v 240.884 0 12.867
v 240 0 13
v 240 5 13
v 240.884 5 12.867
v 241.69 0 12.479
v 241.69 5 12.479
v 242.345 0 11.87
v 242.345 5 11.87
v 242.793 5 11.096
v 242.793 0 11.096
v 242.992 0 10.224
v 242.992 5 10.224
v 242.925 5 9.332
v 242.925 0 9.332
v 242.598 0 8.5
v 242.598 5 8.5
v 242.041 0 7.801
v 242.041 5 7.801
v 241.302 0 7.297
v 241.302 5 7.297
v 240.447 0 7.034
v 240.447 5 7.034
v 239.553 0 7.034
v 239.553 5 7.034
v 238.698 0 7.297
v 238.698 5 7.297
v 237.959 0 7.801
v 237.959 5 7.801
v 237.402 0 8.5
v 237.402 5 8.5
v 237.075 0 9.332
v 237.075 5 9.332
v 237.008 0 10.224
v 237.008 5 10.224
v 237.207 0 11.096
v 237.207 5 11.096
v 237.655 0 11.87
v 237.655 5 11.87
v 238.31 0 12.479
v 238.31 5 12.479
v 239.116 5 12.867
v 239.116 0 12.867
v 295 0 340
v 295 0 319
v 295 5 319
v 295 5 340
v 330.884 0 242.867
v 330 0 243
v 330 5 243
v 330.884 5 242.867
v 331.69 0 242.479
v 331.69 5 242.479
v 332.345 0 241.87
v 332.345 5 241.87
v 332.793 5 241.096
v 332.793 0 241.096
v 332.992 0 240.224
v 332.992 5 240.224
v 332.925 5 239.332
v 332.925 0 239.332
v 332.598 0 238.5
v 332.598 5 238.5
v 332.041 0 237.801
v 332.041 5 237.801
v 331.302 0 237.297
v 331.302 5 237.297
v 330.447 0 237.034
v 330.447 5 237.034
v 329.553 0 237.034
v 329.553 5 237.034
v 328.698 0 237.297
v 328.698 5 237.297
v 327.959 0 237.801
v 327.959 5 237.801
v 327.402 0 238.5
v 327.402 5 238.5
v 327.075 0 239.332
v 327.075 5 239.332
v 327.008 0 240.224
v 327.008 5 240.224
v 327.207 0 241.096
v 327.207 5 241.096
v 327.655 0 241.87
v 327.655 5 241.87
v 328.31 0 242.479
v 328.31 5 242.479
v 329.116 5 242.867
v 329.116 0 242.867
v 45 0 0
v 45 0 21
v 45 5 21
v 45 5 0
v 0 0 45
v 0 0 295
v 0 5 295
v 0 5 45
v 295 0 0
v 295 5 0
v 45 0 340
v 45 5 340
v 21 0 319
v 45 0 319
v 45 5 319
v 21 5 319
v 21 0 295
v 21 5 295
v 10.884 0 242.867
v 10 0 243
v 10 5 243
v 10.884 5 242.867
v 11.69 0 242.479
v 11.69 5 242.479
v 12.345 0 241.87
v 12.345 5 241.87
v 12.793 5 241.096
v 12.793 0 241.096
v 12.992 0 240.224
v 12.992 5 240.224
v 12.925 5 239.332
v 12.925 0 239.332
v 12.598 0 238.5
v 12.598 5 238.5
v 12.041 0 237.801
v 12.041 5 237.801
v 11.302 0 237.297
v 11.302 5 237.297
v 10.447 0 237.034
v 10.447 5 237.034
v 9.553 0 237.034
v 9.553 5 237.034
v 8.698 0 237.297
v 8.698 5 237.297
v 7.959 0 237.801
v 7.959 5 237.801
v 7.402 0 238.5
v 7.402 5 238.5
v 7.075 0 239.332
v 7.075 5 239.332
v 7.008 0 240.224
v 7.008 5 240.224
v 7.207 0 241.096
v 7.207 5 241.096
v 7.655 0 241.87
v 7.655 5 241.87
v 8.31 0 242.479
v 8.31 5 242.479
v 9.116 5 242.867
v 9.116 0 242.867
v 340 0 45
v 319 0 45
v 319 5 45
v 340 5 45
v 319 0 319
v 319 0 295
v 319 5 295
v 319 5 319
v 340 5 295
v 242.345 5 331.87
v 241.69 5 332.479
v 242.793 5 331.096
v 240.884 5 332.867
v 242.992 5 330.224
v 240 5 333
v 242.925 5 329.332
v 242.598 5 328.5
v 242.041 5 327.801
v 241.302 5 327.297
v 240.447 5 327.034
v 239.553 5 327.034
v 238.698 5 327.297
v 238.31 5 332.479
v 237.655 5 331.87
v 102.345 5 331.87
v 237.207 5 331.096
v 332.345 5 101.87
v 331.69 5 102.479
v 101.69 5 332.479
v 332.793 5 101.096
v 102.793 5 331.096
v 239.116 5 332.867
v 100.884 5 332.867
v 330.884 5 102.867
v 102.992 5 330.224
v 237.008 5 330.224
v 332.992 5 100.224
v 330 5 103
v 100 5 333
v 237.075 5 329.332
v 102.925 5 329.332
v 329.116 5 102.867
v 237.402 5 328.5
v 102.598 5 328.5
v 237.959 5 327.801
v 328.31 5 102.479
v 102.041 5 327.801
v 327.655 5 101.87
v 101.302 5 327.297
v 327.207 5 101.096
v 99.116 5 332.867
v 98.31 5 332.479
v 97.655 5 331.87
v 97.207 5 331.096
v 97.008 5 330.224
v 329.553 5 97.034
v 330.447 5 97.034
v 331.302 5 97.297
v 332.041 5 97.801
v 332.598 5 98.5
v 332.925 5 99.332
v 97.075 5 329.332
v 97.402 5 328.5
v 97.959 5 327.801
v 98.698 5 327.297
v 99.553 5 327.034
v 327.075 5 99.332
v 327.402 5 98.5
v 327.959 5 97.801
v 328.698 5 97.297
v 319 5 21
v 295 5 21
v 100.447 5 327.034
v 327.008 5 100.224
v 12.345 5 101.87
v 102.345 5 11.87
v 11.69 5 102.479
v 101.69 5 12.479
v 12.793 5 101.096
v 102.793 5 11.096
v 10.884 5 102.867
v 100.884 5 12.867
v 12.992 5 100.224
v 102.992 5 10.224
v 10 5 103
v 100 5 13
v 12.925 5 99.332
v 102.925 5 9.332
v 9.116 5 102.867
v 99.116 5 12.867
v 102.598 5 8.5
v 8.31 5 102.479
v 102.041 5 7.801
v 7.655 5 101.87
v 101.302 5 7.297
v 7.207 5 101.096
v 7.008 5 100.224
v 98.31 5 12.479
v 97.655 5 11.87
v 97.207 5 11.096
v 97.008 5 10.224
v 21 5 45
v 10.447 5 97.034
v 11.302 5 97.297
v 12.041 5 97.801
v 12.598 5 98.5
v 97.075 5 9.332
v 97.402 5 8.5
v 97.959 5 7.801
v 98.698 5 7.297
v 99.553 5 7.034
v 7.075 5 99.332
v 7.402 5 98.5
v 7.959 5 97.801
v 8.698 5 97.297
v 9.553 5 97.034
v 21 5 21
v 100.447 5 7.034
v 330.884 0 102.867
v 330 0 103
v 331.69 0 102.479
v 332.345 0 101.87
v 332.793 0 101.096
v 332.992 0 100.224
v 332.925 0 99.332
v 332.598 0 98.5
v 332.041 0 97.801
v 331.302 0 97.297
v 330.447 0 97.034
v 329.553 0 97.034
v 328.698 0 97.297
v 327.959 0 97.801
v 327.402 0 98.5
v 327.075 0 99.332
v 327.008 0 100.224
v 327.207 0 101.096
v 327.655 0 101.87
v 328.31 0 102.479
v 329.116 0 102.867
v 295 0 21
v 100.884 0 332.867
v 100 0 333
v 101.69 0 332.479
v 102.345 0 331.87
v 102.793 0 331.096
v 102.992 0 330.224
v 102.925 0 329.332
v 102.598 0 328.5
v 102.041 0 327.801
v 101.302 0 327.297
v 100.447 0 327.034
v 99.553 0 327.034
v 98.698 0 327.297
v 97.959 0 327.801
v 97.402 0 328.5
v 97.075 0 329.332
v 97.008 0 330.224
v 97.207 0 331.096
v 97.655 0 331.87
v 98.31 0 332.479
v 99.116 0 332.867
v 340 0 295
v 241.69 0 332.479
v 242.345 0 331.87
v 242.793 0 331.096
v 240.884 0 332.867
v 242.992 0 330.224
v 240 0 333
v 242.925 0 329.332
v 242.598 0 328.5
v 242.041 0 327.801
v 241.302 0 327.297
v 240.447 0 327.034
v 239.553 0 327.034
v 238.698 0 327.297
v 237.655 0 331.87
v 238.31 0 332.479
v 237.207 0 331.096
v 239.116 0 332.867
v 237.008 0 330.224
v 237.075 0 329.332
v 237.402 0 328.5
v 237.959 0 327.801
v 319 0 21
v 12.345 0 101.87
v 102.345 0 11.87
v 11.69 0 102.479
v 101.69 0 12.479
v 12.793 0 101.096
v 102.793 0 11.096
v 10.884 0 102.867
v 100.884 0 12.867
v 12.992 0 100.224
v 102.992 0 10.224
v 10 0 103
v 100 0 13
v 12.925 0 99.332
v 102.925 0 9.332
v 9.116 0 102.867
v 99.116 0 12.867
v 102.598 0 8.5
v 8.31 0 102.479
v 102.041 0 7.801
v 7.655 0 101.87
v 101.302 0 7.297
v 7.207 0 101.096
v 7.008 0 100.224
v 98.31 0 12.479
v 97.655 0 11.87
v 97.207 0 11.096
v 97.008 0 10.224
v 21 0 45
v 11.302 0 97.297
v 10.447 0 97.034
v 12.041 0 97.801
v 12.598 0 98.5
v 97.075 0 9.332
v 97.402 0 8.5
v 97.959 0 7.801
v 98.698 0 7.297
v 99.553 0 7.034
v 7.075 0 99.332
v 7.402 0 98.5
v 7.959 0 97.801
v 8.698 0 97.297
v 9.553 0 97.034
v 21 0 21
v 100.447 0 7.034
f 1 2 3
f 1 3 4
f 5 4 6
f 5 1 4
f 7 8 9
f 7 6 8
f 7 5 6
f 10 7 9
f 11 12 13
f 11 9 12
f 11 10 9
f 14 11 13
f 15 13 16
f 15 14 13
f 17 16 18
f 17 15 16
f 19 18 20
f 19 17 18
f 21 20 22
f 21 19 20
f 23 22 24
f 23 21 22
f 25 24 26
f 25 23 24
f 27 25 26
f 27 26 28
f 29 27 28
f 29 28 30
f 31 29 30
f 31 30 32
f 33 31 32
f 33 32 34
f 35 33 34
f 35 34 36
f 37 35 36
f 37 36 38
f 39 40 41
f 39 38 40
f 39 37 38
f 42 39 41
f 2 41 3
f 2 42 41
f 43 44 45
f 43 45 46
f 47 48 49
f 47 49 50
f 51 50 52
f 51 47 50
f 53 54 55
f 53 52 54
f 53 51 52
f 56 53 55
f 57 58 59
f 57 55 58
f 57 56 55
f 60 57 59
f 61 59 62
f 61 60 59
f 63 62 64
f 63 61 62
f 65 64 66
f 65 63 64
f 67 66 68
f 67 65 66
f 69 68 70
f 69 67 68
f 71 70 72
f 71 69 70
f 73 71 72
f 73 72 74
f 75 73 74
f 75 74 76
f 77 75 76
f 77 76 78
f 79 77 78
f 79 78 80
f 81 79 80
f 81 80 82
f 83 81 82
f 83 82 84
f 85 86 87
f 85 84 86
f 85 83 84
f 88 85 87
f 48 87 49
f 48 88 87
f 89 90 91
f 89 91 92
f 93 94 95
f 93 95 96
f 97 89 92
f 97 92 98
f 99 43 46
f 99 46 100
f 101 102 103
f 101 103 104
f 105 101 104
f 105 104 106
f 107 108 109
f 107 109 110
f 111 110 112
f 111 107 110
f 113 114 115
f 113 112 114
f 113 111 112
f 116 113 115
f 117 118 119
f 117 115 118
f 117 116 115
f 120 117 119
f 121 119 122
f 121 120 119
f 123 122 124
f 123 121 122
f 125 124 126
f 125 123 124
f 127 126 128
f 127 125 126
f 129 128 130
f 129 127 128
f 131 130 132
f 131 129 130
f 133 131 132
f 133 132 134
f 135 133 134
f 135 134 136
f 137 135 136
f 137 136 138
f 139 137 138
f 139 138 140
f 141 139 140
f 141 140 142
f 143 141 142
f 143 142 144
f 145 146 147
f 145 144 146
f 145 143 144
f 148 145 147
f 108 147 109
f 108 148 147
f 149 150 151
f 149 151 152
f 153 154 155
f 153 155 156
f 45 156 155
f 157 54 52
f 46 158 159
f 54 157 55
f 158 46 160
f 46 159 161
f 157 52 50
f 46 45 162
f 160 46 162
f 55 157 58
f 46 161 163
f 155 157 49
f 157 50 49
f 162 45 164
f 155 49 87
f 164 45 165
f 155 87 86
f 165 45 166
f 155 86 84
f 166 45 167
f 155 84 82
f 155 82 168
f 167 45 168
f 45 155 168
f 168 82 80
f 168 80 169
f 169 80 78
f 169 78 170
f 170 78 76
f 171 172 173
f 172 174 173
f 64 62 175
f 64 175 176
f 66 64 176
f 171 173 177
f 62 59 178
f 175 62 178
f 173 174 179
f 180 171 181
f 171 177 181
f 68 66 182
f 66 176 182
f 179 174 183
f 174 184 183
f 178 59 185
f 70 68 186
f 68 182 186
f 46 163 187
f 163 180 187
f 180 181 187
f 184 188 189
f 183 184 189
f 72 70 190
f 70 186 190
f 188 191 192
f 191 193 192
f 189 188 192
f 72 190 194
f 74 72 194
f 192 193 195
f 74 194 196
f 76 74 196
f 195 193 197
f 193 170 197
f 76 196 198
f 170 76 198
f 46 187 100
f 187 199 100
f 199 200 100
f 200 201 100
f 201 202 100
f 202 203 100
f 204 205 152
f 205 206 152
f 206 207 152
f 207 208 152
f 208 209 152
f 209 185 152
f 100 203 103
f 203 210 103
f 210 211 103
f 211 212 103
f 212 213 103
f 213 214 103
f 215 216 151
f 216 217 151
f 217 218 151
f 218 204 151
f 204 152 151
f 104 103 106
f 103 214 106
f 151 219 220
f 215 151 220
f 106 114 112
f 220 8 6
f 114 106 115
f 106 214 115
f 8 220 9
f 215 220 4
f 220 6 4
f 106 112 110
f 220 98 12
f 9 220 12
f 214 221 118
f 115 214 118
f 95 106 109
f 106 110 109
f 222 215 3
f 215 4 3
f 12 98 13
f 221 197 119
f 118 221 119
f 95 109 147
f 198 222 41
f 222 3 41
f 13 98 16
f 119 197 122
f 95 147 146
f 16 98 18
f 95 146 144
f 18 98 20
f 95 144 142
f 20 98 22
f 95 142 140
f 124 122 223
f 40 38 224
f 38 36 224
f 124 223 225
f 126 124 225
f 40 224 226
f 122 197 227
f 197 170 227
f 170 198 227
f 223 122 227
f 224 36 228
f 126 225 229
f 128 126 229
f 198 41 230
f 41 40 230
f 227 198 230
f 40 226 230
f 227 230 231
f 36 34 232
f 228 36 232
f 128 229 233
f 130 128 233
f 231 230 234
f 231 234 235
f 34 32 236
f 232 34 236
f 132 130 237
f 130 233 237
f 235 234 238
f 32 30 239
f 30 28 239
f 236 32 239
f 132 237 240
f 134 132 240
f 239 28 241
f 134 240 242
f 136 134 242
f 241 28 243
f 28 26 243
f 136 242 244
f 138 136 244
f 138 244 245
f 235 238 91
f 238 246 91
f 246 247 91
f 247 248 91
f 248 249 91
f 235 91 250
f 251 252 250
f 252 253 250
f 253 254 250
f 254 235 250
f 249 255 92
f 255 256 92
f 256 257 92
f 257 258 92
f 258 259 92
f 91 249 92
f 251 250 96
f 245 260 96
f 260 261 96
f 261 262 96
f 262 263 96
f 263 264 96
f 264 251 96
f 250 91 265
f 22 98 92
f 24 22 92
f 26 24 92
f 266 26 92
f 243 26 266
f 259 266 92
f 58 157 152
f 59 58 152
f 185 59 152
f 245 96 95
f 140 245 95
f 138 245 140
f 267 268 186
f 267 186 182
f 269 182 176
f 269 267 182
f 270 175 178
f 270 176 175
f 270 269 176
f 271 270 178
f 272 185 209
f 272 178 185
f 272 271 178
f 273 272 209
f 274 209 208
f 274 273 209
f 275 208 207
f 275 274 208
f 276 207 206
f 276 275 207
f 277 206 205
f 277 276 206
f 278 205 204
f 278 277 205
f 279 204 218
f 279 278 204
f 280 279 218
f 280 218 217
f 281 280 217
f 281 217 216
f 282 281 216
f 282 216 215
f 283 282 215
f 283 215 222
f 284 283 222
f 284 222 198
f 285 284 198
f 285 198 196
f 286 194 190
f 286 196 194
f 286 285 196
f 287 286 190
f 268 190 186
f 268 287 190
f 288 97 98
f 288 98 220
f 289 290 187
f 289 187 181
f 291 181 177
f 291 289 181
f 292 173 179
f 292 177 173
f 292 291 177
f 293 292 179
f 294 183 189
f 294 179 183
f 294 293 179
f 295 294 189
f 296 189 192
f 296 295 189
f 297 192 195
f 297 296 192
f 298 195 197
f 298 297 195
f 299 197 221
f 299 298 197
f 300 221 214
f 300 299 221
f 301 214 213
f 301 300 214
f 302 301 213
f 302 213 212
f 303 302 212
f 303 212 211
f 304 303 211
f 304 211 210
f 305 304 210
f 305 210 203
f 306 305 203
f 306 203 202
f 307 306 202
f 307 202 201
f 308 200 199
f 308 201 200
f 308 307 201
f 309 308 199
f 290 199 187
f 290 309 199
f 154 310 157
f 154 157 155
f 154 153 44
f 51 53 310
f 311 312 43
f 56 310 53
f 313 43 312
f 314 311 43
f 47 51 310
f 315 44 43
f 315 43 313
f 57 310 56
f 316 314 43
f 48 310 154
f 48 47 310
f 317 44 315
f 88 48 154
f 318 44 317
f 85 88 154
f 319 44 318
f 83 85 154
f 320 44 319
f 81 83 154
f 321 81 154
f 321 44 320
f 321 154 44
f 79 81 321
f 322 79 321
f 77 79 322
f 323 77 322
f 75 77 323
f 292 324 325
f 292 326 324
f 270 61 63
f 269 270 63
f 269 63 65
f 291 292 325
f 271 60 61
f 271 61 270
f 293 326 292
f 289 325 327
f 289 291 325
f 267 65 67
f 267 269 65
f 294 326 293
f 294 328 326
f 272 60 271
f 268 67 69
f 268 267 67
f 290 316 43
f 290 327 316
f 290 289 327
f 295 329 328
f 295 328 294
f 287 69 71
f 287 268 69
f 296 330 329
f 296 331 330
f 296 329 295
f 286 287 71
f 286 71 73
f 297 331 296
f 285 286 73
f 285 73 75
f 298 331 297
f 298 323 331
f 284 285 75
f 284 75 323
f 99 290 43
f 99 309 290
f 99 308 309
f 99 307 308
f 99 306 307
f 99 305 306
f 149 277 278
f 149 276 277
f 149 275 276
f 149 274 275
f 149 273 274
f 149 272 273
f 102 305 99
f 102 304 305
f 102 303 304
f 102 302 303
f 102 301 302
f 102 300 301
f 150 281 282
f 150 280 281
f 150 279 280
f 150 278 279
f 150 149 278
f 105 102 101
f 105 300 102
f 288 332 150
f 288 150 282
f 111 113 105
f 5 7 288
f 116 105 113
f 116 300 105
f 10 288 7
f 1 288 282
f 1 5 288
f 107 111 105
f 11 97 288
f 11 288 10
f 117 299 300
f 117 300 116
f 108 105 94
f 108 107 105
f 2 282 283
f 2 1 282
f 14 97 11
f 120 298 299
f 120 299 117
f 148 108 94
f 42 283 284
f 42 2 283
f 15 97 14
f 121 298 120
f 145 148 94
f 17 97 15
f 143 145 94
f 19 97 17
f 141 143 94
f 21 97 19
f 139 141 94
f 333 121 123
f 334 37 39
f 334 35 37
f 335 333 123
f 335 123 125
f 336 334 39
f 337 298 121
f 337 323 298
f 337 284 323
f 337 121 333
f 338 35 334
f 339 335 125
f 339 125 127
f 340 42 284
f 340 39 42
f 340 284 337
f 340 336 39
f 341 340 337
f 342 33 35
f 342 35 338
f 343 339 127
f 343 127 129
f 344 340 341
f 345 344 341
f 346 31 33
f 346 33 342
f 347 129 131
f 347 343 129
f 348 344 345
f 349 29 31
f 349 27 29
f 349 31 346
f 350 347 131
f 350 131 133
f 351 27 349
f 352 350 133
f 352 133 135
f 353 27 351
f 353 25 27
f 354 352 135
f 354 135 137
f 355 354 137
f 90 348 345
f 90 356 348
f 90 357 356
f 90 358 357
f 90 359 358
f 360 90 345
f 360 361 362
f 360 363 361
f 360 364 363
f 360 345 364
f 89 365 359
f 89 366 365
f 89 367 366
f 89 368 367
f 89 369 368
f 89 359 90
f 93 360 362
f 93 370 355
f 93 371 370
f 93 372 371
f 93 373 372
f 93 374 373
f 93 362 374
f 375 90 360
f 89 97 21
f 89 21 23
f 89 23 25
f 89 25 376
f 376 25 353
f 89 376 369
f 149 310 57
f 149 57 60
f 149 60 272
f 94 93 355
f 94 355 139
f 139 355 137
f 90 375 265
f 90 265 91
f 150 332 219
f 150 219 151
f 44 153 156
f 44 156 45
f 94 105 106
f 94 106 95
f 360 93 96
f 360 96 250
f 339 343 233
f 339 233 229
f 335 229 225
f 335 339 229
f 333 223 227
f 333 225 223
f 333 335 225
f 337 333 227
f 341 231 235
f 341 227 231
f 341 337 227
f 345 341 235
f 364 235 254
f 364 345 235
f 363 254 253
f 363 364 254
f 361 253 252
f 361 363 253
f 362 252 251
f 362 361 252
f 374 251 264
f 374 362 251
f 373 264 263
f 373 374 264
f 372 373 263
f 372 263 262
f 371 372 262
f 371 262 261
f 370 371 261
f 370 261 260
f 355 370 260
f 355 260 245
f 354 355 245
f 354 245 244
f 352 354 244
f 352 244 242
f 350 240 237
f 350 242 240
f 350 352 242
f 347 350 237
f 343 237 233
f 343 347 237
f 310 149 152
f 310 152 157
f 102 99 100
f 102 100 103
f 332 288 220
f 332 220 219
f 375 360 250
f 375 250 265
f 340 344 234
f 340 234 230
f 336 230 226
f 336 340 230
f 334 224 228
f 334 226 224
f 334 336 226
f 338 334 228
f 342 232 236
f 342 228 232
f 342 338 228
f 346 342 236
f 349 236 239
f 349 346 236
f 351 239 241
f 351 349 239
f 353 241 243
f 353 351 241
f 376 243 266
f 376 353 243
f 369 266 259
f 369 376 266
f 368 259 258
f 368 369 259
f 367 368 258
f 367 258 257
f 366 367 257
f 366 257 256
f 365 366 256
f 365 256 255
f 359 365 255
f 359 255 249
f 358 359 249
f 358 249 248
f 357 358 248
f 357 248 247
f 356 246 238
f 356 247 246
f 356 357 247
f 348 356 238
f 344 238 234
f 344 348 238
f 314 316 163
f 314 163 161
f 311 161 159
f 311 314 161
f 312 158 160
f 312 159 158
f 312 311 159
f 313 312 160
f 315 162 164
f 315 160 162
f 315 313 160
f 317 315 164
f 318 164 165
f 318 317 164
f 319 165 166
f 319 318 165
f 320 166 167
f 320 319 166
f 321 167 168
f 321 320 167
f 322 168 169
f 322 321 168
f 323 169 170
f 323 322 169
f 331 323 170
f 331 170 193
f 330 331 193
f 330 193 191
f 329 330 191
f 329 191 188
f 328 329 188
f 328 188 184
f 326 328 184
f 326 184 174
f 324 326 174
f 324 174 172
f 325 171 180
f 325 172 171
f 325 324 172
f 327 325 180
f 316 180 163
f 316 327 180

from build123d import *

# Parameters (mm, degrees)
BOSS_EXTRUDE1_DEPTH     = 5
CUT_EXTRUDE1_DEPTH      = 57
CUT_EXTRUDE1_DEPTH_BACK = 57
SKETCH2_R               = 3


with BuildPart() as part:
    # Sketch1 → Boss-Extrude1 (new body)
    with BuildSketch(Plane(origin=(0, 0, 0), x_dir=(1, 0, 0), z_dir=(0, 1, 0))):
        Polygon((0, -45), (21, -45), (21, -21), (45, -21), (45, 0), (295, 0), (295, -21), (319, -21), (319, -45), (340, -45), (340, -295), (319, -295), (319, -319), (295, -319), (295, -340), (45, -340), (45, -319), (21, -319), (21, -295), (0, -295), align=None)
    extrude(amount=BOSS_EXTRUDE1_DEPTH)

    # Sketch2 → Cut-Extrude1 (cut, two sides: drawn at the far end of the back side and taken through both)
    with BuildSketch(Plane(origin=(0, 5, 0), x_dir=(1, 0, 0), z_dir=(0, 1, 0)).offset(-CUT_EXTRUDE1_DEPTH_BACK)):
        with Locations((100, -10)):
            Circle(SKETCH2_R)
        with Locations((240, -10)):
            Circle(SKETCH2_R)
        with Locations((240, -330)):
            Circle(SKETCH2_R)
        with Locations((100, -330)):
            Circle(SKETCH2_R)
        with Locations((10, -240)):
            Circle(SKETCH2_R)
        with Locations((10, -100)):
            Circle(SKETCH2_R)
        with Locations((330, -240)):
            Circle(SKETCH2_R)
        with Locations((330, -100)):
            Circle(SKETCH2_R)
    extrude(amount=CUT_EXTRUDE1_DEPTH + CUT_EXTRUDE1_DEPTH_BACK, mode=Mode.SUBTRACT)


solid = part.part
